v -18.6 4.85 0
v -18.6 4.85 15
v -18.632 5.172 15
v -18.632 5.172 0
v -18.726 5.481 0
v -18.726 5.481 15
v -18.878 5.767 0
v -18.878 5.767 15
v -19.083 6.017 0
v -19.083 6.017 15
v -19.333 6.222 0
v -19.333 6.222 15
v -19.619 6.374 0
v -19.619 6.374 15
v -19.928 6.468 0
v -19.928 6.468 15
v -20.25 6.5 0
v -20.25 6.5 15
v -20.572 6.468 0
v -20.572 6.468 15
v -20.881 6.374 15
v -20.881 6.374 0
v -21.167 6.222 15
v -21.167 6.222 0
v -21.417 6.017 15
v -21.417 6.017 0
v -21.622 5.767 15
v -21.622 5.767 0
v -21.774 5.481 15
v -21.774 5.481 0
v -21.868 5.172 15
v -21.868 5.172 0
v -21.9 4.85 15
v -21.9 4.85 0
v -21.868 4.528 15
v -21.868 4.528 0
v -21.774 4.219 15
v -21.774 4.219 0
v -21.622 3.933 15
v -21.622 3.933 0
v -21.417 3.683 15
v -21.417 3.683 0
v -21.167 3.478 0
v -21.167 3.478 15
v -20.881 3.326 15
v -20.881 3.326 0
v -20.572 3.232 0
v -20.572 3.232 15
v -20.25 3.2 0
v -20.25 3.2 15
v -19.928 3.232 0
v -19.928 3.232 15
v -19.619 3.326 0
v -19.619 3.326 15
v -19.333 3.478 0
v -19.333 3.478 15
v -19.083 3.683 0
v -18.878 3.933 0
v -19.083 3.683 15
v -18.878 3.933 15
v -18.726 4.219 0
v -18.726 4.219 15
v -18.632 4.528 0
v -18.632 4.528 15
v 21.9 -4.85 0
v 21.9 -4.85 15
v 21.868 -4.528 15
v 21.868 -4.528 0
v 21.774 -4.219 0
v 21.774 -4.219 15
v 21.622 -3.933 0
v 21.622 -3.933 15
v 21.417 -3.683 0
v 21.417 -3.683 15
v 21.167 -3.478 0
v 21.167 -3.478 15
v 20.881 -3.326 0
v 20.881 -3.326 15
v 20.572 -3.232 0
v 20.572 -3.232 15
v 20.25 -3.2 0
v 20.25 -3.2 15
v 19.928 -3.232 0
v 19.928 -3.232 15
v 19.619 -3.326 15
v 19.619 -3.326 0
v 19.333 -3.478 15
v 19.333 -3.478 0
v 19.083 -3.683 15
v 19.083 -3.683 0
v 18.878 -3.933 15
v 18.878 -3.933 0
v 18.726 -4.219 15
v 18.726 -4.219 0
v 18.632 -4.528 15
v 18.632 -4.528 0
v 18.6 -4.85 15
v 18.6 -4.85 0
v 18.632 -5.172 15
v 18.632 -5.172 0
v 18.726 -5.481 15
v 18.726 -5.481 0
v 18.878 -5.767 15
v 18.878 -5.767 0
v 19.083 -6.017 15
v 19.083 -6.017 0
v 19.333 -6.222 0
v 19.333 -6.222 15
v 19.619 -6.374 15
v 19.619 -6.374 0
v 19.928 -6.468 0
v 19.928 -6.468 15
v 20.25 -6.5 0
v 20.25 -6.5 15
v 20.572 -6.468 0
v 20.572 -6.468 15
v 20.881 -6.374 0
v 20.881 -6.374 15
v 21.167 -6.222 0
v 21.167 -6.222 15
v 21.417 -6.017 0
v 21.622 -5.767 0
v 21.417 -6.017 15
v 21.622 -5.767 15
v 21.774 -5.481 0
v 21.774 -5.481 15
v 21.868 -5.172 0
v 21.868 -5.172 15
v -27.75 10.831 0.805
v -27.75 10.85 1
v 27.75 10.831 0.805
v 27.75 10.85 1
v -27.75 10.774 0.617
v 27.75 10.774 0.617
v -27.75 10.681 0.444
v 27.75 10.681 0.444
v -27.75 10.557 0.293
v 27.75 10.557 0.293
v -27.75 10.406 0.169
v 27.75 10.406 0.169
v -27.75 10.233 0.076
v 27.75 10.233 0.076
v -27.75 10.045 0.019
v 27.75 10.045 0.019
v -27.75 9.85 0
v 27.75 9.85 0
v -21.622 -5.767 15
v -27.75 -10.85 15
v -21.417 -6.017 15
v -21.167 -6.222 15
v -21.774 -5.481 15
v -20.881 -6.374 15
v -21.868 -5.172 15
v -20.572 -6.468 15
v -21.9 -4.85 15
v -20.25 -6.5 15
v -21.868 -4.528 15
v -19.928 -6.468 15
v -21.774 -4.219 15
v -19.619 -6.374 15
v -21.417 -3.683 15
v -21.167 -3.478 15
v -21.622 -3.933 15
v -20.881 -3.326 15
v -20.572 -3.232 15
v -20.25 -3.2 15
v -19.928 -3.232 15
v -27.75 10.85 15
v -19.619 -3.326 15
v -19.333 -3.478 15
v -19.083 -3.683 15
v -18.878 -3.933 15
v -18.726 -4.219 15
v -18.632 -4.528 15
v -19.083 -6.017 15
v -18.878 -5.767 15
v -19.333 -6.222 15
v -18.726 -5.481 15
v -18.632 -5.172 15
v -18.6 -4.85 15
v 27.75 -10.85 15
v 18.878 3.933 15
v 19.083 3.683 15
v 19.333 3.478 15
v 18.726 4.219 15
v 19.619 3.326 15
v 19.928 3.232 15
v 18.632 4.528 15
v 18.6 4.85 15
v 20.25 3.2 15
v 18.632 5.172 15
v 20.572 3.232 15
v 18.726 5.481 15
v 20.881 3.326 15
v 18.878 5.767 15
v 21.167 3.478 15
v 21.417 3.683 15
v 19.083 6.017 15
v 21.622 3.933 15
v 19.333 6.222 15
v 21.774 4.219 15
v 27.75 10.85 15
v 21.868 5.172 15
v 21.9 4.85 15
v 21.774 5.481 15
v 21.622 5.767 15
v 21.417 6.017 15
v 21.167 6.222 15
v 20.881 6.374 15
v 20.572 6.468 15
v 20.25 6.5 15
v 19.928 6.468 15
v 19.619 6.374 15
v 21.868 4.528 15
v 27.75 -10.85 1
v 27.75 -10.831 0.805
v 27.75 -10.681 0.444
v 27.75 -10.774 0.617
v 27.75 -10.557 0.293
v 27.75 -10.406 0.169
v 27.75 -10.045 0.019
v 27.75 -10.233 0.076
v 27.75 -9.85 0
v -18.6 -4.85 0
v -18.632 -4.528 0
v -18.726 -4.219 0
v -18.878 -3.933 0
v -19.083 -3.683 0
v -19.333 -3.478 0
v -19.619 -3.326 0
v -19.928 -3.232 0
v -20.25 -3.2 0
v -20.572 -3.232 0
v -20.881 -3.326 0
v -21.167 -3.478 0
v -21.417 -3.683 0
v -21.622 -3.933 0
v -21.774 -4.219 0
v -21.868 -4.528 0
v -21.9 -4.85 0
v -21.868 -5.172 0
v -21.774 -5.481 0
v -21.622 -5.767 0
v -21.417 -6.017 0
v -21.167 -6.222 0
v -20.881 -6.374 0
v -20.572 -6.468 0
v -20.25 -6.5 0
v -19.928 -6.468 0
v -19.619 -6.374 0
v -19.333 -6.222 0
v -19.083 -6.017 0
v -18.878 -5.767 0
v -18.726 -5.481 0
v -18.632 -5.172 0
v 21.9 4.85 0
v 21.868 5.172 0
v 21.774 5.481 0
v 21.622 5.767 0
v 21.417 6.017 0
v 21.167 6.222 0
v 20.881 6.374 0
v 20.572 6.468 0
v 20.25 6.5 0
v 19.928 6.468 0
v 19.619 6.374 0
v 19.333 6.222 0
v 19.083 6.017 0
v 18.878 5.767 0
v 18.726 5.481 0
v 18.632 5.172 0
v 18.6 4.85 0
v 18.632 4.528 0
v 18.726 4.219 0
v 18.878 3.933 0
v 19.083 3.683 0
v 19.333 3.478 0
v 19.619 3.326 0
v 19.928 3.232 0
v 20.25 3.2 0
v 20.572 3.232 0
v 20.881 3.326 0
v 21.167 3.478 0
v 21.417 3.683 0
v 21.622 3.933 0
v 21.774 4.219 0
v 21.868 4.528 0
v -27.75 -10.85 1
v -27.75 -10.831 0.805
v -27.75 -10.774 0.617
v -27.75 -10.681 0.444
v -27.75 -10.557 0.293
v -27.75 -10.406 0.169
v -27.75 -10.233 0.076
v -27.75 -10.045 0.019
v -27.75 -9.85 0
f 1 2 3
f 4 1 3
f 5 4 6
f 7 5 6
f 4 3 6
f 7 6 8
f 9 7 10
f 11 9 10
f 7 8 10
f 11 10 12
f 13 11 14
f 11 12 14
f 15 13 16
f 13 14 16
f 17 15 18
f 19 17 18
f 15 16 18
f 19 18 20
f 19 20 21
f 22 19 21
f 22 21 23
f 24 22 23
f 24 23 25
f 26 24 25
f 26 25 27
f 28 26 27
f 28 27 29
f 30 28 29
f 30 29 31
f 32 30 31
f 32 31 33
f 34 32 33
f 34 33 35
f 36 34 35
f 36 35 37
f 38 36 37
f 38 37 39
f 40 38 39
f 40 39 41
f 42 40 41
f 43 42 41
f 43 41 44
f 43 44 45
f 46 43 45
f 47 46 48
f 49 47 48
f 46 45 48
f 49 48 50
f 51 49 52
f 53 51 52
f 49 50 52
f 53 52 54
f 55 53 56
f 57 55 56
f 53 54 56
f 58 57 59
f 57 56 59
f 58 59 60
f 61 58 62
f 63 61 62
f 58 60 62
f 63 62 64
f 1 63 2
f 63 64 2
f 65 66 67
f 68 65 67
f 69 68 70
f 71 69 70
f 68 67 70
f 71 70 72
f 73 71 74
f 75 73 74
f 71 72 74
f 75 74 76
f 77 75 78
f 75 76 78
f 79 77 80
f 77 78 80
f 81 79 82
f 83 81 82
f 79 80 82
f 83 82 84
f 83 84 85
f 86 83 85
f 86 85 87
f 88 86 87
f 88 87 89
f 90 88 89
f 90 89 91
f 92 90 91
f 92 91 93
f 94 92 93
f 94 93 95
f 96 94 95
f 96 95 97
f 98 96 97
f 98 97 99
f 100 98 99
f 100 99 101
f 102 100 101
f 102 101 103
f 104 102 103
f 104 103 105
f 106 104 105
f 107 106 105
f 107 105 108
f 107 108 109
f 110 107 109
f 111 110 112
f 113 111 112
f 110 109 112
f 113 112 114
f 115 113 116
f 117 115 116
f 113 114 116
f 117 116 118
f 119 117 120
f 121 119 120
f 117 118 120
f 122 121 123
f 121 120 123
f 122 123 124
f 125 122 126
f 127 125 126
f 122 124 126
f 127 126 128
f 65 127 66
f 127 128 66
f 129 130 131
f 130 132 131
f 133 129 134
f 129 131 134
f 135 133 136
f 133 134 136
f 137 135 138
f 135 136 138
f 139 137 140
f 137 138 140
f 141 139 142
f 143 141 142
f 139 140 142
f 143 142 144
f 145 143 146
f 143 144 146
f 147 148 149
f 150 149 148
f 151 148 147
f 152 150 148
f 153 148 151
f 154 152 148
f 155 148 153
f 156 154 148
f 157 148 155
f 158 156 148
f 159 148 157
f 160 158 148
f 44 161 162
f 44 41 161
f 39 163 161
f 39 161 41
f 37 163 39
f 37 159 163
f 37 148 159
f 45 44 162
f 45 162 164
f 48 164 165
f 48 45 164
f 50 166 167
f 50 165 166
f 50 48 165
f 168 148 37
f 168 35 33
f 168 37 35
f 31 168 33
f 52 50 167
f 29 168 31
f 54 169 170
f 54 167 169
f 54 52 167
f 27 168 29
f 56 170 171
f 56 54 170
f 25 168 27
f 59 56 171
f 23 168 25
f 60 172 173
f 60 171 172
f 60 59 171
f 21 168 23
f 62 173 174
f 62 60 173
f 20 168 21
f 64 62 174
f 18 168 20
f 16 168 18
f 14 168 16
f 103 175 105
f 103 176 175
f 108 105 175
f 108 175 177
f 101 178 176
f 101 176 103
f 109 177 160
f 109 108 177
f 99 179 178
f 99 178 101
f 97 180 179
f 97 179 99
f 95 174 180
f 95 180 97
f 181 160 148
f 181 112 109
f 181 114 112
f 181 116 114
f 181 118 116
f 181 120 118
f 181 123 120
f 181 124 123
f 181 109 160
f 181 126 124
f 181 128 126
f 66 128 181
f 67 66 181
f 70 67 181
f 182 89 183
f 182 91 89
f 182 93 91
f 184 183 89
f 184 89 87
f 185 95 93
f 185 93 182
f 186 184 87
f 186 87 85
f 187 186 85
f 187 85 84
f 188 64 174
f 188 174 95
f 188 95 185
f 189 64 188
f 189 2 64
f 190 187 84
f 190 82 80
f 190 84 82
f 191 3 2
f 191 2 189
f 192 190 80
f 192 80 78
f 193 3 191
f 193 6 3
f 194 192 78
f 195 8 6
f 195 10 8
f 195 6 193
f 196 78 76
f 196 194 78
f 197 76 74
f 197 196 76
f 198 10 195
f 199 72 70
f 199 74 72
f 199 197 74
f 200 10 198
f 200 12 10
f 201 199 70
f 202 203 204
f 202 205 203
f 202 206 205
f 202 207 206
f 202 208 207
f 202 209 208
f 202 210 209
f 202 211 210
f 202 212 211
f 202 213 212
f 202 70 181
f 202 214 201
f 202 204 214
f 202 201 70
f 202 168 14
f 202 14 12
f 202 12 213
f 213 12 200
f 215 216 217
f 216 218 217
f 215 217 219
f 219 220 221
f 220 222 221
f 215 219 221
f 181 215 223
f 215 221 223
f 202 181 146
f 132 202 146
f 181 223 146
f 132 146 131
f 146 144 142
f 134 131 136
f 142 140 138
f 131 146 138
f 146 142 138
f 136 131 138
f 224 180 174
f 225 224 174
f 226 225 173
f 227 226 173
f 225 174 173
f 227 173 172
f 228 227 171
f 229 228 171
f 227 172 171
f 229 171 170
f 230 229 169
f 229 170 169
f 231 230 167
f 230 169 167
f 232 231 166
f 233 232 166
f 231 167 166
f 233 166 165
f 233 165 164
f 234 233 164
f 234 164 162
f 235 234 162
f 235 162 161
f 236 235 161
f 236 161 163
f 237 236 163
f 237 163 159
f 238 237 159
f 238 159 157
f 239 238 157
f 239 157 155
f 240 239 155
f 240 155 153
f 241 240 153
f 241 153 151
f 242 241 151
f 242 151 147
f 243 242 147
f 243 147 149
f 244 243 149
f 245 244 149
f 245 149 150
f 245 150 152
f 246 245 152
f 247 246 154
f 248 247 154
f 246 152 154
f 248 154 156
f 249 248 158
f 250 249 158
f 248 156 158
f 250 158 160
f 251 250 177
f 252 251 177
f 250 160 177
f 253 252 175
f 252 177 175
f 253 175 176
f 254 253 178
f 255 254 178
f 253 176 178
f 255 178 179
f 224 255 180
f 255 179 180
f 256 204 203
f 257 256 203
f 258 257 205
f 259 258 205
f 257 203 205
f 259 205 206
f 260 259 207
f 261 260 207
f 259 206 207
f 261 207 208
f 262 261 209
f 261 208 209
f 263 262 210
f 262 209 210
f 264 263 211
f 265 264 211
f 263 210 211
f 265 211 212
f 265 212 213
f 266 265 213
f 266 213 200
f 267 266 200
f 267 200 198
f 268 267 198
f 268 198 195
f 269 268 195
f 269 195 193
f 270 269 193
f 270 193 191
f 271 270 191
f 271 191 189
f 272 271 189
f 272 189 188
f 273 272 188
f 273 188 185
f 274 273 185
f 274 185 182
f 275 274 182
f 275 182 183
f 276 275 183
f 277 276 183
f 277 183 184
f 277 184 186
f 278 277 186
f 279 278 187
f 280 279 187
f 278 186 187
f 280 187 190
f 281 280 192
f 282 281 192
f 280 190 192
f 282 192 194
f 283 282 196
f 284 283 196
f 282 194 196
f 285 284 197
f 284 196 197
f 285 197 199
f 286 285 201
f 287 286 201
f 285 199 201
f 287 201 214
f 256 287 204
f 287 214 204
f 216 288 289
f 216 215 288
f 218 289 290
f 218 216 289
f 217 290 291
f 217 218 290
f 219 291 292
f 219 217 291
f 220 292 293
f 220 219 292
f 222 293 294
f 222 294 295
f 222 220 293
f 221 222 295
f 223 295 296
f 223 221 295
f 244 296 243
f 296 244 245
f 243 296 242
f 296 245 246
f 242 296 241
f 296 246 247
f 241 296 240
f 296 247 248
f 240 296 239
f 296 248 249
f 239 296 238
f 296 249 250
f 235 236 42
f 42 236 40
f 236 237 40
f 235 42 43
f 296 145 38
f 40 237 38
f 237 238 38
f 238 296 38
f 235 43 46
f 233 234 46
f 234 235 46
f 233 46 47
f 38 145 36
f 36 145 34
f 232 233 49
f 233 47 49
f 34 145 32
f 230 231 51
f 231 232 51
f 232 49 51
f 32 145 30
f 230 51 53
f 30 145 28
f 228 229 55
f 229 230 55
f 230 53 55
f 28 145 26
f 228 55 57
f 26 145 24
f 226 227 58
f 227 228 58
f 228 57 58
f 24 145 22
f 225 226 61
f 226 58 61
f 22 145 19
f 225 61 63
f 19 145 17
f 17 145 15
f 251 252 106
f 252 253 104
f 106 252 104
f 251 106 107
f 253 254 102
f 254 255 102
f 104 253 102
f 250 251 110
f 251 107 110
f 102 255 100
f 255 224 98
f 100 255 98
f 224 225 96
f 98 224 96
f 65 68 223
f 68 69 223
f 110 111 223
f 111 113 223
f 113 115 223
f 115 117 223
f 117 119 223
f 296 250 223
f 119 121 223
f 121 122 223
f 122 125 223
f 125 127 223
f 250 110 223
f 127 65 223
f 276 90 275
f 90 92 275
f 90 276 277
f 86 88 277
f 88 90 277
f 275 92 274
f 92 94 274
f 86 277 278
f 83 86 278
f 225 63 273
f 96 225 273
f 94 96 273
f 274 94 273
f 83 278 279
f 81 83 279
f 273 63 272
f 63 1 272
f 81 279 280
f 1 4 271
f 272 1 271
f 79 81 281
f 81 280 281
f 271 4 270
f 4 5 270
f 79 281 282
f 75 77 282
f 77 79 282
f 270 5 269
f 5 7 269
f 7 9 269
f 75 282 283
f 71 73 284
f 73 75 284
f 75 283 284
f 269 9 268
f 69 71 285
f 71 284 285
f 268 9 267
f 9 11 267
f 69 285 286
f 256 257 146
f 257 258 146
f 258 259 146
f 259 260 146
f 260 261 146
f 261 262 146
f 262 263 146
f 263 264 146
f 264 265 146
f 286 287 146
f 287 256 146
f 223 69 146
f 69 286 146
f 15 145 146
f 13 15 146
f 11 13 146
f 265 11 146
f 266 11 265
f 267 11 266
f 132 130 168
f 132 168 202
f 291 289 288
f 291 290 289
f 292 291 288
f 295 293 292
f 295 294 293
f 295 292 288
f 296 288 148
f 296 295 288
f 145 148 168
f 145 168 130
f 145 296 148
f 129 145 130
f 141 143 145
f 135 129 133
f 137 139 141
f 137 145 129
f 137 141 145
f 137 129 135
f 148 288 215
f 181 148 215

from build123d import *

# Parameters (mm, degrees)
SKETCH1_W           = 55.5
SKETCH1_H           = 21.7
BOSS_EXTRUDE1_DEPTH = 15
SKETCH3_R           = 1.65
CUT_EXTRUDE1_DEPTH  = 16
FILLET1_R           = 1


with BuildPart() as part:
    # Sketch1 → Boss-Extrude1 (new body)
    with BuildSketch(Plane.XY):
        Rectangle(SKETCH1_W, SKETCH1_H)
    extrude(amount=BOSS_EXTRUDE1_DEPTH)

    # Sketch3 → Cut-Extrude1 (cut, through all)
    with BuildSketch(Plane.XY.offset(15)):
        with Locations((-20.25, 4.85)):
            Circle(SKETCH3_R)
        with Locations((-20.25, -4.85)):
            Circle(SKETCH3_R)
        with Locations((20.25, -4.85)):
            Circle(SKETCH3_R)
        with Locations((20.25, 4.85)):
            Circle(SKETCH3_R)
    extrude(amount=-CUT_EXTRUDE1_DEPTH, mode=Mode.SUBTRACT)

    # Fillet1
    fillet1_edges = [part.edges().sort_by_distance(p)[0] for p in [
        (0, -10.85, 0),
        (0, 10.85, 0),
    ]]
    fillet(fillet1_edges, radius=FILLET1_R)


solid = part.part
